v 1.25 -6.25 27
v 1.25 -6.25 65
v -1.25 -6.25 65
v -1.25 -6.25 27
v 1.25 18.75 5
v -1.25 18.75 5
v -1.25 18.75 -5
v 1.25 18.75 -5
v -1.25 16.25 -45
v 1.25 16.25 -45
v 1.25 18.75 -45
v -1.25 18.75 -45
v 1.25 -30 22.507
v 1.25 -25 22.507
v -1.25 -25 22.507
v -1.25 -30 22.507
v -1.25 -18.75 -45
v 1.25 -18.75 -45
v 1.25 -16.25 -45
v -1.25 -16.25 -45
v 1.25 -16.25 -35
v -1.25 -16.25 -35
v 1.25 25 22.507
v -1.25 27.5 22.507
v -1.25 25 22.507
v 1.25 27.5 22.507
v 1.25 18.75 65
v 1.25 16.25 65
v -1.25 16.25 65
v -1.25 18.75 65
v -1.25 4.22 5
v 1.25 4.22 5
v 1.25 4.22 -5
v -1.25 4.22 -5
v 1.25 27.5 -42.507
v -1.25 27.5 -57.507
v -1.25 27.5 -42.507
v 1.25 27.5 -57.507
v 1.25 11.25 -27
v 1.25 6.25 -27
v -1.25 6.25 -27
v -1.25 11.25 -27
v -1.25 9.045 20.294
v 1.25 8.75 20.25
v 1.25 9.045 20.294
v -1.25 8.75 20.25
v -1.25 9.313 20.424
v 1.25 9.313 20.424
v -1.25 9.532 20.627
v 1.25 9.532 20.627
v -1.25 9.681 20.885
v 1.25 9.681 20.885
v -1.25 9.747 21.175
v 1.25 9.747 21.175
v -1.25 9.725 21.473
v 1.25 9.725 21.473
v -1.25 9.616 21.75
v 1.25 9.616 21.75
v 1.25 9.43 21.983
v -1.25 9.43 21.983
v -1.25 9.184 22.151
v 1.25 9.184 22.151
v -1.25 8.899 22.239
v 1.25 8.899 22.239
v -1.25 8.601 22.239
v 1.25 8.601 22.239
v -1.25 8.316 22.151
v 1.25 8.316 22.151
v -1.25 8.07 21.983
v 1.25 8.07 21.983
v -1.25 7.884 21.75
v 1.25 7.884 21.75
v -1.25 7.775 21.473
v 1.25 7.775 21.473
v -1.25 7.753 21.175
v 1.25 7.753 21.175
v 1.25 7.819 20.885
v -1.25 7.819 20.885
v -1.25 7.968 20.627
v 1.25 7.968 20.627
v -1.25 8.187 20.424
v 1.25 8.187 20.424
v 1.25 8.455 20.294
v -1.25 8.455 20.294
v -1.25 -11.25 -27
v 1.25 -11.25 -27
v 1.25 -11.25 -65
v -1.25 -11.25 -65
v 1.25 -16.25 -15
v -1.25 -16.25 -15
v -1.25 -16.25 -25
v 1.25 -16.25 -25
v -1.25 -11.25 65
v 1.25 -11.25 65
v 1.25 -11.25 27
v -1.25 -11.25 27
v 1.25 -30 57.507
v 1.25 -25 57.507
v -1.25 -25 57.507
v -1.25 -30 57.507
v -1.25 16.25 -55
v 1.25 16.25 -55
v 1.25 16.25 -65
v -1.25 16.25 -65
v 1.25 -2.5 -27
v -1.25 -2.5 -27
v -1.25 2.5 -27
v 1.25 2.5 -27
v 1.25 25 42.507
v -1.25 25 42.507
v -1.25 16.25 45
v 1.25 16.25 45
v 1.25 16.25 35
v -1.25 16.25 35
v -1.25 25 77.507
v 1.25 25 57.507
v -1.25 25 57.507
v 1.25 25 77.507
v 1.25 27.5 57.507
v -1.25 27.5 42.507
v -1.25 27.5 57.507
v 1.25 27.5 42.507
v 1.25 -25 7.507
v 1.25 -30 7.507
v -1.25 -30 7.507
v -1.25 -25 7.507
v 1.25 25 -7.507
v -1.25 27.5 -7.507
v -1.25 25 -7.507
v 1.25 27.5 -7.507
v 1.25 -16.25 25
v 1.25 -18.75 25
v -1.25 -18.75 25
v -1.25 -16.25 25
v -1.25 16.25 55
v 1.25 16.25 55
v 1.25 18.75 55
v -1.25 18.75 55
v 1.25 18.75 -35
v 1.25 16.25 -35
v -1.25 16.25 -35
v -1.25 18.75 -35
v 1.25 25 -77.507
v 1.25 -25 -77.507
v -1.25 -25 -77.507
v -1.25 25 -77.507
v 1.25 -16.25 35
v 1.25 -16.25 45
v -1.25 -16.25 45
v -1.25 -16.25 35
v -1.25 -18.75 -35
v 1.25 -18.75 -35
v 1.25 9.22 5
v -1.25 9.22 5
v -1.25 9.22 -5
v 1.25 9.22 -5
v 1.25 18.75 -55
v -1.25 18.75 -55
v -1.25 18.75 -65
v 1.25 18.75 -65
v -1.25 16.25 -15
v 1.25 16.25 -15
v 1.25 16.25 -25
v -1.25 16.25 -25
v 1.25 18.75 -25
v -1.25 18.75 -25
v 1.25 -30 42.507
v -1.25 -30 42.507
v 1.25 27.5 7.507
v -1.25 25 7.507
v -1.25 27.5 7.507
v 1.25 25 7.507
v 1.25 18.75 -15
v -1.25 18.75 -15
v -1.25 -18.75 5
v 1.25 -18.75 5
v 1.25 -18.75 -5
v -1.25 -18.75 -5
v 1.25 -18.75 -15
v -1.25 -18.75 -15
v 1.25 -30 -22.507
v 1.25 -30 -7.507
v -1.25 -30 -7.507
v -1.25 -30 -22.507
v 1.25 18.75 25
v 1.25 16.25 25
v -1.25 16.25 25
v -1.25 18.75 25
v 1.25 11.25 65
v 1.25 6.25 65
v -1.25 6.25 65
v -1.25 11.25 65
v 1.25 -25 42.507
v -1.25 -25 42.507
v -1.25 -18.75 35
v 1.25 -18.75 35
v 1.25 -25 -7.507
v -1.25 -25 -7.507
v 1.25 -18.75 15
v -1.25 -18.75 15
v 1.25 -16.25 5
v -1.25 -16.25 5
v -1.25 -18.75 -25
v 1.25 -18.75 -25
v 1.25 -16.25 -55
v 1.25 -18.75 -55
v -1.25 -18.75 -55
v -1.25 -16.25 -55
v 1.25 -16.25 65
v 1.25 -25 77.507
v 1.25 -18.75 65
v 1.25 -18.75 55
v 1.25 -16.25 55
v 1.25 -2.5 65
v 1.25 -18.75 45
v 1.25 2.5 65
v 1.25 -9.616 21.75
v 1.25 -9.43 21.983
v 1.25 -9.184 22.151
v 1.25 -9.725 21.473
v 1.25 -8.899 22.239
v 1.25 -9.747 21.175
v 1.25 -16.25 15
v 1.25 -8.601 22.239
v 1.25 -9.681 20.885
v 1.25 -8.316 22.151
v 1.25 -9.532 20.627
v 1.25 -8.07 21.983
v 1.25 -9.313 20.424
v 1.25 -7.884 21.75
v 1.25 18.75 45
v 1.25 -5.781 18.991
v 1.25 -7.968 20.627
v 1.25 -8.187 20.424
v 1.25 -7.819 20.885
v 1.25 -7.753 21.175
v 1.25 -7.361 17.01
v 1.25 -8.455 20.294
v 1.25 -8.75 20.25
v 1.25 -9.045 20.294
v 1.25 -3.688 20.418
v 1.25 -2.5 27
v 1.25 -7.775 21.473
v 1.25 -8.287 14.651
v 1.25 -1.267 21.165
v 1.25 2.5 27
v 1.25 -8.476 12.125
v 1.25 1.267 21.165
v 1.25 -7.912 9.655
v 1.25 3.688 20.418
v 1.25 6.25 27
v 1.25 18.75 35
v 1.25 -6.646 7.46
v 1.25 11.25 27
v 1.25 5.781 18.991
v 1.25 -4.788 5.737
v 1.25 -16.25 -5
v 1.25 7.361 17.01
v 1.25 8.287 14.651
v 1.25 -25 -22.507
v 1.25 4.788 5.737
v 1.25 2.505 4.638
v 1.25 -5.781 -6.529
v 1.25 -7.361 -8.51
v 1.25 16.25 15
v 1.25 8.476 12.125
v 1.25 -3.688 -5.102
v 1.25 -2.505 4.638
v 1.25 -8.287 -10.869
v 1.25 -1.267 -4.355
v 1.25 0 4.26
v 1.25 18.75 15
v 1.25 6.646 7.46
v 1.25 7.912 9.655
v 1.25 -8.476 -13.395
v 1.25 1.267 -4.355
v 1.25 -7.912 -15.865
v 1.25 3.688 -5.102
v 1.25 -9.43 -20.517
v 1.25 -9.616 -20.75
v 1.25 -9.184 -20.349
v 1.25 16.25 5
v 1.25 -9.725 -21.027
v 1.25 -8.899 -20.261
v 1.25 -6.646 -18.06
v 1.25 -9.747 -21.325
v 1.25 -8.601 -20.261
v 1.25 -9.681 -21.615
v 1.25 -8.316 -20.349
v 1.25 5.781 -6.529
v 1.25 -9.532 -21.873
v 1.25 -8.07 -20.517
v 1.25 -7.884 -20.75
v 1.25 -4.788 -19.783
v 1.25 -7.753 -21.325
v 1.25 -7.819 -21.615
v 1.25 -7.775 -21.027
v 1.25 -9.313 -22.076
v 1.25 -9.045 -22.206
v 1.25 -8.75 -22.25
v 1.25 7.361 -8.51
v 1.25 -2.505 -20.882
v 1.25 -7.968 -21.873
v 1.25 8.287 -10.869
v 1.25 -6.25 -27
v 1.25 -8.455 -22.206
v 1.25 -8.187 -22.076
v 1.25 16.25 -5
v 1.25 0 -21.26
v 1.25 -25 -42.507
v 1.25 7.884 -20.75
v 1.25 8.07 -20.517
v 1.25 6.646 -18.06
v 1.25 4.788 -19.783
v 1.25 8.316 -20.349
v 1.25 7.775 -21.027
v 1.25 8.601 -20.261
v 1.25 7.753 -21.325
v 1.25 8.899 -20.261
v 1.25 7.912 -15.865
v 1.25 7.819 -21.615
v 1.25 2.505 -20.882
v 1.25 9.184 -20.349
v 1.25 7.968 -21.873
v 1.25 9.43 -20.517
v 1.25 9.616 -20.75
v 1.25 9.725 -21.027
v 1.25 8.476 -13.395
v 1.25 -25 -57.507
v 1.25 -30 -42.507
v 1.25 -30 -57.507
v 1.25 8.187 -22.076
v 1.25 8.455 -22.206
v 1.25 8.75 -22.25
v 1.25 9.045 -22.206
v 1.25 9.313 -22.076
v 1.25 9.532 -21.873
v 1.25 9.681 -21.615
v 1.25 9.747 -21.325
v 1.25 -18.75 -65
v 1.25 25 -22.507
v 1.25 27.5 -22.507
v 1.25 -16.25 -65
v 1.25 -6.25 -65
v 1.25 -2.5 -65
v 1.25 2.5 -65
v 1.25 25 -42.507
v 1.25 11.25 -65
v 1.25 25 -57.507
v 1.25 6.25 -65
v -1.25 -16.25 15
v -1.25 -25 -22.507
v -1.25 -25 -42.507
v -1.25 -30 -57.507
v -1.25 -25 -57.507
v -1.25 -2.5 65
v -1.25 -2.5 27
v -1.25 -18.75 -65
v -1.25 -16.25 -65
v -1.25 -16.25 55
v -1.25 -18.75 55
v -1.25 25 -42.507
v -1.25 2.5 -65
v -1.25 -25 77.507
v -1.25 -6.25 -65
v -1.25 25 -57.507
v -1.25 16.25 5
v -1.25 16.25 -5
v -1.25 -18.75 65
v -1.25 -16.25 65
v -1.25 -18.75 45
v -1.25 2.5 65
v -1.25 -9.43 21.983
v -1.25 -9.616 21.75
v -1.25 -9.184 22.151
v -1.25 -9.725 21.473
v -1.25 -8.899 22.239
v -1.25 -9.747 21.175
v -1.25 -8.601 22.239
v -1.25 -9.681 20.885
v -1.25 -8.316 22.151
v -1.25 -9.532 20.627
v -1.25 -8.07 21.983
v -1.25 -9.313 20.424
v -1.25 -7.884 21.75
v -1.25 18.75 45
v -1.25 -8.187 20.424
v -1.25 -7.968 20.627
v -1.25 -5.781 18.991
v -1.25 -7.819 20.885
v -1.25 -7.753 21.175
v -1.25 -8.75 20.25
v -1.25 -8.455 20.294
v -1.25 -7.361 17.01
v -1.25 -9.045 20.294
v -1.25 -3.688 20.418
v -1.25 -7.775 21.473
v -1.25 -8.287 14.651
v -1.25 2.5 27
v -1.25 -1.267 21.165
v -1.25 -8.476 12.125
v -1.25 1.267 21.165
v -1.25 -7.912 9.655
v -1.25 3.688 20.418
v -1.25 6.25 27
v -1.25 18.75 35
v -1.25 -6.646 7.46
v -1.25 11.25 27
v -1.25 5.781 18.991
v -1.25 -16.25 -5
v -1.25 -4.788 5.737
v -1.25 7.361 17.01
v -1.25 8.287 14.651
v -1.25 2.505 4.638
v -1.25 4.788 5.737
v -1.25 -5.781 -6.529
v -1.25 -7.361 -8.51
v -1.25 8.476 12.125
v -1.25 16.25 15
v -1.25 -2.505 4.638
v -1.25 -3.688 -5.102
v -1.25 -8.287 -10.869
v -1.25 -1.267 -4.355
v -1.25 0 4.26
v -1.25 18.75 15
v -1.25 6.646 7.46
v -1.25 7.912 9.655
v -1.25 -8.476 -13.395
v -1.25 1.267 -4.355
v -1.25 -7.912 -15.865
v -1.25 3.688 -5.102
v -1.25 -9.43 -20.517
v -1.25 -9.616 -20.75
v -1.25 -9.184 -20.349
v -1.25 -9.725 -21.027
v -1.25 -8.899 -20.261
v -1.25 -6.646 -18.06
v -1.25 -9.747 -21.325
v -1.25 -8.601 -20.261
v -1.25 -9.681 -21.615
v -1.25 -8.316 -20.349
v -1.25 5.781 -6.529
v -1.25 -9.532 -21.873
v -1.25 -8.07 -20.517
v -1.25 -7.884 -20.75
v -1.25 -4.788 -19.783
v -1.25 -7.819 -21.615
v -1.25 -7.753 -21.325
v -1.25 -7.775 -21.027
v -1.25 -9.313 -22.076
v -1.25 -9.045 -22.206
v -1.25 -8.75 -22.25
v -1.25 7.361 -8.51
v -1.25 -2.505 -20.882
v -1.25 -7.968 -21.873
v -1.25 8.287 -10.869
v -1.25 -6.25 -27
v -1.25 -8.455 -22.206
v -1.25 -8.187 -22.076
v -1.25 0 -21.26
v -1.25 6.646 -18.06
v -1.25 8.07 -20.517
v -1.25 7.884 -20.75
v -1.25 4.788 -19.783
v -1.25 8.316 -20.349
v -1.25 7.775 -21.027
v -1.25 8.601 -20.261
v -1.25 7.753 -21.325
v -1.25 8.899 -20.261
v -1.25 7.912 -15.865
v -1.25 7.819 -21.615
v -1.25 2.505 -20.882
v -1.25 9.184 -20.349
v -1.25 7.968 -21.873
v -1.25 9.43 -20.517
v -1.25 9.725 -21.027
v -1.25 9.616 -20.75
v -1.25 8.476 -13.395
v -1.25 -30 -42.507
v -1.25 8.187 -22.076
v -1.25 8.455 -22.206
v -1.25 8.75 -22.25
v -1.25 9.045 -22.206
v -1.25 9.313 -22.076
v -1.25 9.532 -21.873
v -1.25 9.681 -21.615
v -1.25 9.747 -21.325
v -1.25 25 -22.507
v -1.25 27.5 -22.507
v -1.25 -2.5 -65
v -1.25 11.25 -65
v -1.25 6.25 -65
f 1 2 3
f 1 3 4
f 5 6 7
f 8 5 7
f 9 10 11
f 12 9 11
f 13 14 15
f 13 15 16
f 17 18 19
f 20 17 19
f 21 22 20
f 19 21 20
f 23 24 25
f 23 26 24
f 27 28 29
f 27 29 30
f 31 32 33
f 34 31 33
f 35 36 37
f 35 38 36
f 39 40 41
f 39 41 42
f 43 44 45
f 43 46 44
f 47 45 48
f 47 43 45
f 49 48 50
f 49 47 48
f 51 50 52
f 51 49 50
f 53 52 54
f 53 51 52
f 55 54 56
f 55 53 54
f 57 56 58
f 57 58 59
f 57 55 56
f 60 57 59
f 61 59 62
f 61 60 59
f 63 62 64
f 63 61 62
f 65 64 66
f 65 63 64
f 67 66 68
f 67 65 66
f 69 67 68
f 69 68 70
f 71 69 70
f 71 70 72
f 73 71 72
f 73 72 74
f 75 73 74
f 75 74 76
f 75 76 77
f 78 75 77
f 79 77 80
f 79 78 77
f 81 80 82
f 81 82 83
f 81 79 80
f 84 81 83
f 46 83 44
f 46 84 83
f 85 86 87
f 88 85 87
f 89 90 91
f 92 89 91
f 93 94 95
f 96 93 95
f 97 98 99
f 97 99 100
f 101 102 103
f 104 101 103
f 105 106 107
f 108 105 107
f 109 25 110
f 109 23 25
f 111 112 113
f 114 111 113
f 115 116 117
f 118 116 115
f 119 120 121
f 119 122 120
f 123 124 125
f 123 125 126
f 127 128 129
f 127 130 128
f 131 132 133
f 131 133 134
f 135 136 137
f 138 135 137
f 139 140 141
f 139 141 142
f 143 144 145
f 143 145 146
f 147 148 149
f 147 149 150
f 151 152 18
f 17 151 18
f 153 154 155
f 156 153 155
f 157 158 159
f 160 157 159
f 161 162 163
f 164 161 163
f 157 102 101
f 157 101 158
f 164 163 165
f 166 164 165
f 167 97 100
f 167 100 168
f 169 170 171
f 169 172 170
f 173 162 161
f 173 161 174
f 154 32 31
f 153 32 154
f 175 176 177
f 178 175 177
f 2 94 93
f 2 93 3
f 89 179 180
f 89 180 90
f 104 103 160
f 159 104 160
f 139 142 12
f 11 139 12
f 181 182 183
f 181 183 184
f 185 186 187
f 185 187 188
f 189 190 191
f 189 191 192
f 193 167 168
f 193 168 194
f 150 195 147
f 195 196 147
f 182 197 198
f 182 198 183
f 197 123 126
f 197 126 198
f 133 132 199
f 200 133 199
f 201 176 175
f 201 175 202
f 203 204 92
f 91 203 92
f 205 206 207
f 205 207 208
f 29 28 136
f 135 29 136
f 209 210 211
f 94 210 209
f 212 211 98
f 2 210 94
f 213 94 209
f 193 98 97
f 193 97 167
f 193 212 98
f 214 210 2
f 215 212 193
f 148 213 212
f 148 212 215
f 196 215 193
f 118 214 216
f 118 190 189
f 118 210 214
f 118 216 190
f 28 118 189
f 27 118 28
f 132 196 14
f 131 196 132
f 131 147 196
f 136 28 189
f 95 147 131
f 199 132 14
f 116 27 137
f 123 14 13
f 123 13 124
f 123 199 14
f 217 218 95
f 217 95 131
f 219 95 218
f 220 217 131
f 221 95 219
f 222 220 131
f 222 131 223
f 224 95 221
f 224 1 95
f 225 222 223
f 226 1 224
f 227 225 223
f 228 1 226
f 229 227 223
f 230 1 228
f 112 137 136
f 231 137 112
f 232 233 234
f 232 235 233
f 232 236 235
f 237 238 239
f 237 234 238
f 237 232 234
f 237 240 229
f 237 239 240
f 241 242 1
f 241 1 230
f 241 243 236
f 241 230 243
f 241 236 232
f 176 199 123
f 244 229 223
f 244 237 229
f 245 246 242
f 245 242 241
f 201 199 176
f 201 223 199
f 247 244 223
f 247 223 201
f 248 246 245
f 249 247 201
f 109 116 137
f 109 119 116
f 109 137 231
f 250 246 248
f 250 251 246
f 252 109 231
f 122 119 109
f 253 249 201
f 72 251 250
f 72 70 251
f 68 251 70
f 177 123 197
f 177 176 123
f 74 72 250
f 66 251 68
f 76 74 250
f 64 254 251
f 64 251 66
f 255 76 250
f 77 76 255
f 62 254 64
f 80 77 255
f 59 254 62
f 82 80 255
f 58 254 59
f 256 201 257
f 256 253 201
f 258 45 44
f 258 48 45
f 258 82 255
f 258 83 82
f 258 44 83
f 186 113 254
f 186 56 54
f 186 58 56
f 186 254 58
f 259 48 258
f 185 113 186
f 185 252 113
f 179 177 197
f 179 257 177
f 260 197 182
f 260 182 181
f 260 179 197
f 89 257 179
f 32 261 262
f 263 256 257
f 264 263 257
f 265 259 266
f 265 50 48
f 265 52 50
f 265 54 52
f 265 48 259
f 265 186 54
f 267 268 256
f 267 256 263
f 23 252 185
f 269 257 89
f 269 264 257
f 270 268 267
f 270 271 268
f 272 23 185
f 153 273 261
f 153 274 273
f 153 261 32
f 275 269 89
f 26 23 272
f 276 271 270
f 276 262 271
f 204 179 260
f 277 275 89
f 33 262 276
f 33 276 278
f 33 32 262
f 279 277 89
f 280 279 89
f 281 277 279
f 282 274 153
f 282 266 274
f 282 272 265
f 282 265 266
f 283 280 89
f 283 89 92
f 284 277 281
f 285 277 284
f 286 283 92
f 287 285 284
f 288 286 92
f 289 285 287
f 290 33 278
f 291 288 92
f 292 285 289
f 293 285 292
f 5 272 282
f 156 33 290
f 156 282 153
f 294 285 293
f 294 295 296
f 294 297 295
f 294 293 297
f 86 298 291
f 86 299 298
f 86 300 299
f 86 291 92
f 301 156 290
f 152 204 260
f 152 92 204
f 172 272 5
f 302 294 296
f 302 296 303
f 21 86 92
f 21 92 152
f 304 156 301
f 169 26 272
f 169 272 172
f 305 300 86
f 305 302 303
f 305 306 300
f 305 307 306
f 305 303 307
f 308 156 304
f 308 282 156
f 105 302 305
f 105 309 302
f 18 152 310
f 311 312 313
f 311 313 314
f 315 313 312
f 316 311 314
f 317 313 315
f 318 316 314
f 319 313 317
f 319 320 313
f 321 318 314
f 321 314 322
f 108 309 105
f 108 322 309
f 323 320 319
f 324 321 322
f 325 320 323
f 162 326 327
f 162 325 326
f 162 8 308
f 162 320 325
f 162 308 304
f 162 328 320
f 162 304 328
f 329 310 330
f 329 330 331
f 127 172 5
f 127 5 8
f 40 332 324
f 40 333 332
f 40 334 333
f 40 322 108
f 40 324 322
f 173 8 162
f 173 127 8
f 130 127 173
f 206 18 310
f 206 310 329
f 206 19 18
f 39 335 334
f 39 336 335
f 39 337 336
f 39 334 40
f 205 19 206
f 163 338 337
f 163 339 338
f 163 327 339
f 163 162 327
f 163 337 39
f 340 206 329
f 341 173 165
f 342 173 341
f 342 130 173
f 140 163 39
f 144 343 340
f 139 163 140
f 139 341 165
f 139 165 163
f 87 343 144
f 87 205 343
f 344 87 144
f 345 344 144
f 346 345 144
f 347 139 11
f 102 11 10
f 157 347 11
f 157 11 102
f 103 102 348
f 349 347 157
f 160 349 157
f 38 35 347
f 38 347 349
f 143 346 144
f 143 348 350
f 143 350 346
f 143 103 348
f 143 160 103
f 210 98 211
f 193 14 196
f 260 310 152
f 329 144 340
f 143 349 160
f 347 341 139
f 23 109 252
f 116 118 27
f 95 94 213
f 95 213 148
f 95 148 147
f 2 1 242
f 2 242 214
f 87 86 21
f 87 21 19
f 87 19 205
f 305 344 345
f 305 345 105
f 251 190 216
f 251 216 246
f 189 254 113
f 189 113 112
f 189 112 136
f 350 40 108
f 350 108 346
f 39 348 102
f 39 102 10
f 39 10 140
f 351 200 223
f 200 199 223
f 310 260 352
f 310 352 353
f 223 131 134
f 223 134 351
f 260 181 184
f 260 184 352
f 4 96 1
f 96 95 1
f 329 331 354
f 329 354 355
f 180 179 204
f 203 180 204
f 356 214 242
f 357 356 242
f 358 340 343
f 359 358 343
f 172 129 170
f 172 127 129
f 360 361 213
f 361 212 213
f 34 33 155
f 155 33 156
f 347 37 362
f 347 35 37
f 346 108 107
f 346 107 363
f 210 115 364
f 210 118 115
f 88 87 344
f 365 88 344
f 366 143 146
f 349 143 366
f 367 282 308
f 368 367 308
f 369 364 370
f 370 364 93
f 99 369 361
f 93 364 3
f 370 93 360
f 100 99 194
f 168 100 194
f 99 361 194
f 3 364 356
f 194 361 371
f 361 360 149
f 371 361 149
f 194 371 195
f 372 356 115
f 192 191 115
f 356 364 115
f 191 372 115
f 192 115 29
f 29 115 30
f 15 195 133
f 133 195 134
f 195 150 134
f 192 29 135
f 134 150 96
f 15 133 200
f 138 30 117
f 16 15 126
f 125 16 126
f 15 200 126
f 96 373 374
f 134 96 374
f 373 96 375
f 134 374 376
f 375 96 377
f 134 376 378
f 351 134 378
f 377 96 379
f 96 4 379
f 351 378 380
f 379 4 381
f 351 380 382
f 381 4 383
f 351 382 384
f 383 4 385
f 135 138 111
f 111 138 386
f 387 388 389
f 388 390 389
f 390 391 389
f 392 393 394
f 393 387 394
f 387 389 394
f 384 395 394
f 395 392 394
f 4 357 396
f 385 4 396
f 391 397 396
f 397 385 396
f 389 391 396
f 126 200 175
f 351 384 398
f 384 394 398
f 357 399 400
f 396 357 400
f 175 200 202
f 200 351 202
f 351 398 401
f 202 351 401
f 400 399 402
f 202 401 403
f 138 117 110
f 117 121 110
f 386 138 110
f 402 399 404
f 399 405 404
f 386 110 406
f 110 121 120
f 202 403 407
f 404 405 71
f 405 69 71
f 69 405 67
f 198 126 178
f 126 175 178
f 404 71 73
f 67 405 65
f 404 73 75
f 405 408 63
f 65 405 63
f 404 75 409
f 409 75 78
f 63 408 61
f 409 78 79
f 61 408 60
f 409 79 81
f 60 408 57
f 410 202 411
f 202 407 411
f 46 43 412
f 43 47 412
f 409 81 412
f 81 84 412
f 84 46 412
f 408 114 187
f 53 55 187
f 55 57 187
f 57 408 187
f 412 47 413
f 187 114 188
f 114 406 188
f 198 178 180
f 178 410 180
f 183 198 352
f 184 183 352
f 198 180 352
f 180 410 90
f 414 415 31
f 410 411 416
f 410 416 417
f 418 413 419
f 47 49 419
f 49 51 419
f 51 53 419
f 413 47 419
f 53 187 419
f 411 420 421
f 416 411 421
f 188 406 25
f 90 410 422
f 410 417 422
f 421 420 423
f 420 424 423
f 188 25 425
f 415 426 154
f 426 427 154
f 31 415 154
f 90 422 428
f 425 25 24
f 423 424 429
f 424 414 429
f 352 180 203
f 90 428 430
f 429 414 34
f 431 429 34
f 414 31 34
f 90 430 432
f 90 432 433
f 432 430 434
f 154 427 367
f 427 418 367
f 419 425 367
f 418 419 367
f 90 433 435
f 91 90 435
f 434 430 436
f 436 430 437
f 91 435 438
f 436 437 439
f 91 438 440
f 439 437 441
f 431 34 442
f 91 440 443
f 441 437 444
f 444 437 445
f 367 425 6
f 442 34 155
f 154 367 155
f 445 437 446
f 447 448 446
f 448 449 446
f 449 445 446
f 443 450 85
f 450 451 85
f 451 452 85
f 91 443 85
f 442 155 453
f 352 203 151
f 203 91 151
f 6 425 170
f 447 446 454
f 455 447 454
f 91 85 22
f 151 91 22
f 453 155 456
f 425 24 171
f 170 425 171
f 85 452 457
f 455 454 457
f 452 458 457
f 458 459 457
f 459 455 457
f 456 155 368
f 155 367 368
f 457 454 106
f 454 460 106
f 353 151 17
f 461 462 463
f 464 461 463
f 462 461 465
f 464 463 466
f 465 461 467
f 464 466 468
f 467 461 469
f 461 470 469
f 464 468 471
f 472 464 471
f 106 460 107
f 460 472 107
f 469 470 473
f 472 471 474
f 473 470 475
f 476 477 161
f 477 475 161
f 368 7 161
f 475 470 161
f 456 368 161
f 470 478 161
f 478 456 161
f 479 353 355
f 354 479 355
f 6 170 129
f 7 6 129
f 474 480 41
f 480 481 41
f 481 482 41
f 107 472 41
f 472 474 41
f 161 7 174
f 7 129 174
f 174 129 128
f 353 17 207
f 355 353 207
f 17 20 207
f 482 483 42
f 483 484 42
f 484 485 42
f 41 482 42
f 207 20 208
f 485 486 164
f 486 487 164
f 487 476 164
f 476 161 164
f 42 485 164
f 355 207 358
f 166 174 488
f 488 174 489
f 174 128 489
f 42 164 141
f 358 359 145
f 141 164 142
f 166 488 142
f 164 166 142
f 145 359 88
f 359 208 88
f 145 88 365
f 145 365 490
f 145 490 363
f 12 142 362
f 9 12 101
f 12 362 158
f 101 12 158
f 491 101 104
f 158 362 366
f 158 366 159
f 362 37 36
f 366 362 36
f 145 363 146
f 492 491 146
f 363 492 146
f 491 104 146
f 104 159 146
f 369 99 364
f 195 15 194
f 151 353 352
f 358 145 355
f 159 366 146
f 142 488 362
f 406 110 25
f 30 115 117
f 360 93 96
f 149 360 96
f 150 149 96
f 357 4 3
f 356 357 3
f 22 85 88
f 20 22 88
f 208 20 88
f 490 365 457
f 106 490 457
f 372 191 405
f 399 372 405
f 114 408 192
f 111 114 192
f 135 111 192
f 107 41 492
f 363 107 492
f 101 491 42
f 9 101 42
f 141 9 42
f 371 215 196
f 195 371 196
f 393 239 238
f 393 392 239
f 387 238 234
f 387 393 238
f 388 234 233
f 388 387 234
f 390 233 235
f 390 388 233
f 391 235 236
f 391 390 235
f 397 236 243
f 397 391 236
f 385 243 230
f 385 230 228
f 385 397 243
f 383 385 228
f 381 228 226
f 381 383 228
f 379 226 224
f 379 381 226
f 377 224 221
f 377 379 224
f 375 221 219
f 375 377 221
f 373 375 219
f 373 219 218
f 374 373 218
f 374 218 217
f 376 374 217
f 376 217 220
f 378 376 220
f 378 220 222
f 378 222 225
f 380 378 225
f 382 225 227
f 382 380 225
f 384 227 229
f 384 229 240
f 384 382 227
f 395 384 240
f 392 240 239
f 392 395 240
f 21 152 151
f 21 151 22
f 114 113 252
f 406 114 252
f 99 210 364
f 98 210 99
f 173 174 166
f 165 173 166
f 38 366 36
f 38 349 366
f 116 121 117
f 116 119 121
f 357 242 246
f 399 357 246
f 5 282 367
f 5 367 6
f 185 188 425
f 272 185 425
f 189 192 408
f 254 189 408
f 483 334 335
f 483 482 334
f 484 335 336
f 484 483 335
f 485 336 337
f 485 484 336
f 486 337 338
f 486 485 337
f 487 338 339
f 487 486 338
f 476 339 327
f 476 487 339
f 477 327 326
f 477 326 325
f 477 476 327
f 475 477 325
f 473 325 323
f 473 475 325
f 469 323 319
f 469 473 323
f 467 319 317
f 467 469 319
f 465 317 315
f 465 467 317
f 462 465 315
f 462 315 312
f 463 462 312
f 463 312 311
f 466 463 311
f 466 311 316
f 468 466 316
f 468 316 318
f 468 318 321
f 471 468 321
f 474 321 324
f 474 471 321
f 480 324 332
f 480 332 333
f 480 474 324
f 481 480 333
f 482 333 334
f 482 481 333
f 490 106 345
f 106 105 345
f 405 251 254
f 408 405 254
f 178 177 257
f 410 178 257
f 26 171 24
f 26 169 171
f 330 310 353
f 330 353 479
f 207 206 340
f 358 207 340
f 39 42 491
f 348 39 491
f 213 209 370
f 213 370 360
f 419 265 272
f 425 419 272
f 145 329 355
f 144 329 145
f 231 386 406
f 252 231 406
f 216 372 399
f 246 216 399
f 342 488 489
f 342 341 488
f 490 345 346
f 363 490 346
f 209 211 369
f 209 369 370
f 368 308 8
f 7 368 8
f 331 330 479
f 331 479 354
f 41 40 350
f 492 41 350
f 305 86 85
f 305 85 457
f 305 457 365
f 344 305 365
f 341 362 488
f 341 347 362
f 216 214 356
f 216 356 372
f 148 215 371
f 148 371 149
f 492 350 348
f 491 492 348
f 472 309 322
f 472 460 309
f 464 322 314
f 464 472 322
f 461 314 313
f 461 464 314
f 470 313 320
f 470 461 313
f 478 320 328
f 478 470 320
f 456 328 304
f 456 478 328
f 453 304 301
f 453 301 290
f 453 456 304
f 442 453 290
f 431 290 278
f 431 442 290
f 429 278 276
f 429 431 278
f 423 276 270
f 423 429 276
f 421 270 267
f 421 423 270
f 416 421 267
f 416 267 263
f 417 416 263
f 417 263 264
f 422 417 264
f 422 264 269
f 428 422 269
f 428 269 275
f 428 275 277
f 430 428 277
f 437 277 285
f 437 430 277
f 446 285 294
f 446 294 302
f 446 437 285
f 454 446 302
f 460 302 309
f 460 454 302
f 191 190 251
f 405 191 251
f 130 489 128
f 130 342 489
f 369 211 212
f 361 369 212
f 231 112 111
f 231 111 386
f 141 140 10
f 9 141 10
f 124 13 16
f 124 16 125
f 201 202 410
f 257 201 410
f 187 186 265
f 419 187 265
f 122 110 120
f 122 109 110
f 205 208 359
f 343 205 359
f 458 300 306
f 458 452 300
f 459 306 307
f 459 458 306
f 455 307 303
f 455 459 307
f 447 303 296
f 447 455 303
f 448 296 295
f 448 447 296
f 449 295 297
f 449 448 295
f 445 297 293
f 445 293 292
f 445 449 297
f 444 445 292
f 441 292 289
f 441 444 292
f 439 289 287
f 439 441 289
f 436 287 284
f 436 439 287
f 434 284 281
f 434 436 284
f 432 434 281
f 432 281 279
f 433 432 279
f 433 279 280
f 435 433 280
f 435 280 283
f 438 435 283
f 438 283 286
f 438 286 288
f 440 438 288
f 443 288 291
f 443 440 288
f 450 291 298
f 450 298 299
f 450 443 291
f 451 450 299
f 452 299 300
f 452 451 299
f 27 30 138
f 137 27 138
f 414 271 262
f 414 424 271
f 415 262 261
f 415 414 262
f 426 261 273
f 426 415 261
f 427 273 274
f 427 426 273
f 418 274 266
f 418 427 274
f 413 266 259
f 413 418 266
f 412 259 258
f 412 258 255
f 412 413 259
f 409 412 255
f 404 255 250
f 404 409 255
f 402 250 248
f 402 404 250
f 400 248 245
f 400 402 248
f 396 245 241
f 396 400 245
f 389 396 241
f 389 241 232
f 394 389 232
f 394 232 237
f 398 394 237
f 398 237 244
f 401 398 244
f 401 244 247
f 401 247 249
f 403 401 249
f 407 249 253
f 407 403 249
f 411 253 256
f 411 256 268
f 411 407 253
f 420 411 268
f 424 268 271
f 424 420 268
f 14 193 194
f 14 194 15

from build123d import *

# Parameters (mm, degrees)
SKETCH1_R           = 1
SKETCH1_R_2         = 8.5
SKETCH1_W           = 10
SKETCH1_H           = 2.5
SKETCH1_W_2         = 38
SKETCH1_H_2         = 5
BOSS_EXTRUDE1_DEPTH = 1.25


with BuildPart() as part:
    # Sketch1 → Boss-Extrude1 (new, symmetric)
    with BuildSketch(Plane(origin=(0, 0, 0), x_dir=(0, 0, -1), z_dir=(1, 0, 0))):
        Polygon((-77.50700933, 25), (-77.50700933, -25), (-57.50700933, -25), (-57.50700933, -30), (-42.50700933, -30), (-42.50700933, -25), (-22.50700933, -25), (-22.50700933, -30), (-7.50700933, -30), (-7.50700933, -25), (7.50700933, -25), (7.50700933, -30), (22.50700933, -30), (22.50700933, -25), (42.50700933, -25), (42.50700933, -30), (57.50700933, -30), (57.50700933, -25), (77.50700933, -25), (77.50700933, 25), (57.50700933, 25), (57.50700933, 27.5), (42.50700933, 27.5), (42.50700933, 25), (22.50700933, 25), (22.50700933, 27.5), (7.50700933, 27.5), (7.50700933, 25), (-7.50700933, 25), (-7.50700933, 27.5), (-22.50700933, 27.5), (-22.50700933, 25), (-42.50700933, 25), (-42.50700933, 27.5), (-57.50700933, 27.5), (-57.50700933, 25), align=None)
        with Locations((-21.25, 8.75)):
            Circle(SKETCH1_R, mode=Mode.SUBTRACT)
        with Locations((-12.76, 0)):
            Circle(SKETCH1_R_2, mode=Mode.SUBTRACT)
        with Locations((-21.25, -8.75)):
            Circle(SKETCH1_R, mode=Mode.SUBTRACT)
        with Locations((12.76, 0)):
            Circle(SKETCH1_R_2, mode=Mode.SUBTRACT)
        with Locations((21.25, -8.75)):
            Circle(SKETCH1_R, mode=Mode.SUBTRACT)
        with Locations((21.25, 8.75)):
            Circle(SKETCH1_R, mode=Mode.SUBTRACT)
        with Locations((0, 17.5)):
            Rectangle(SKETCH1_W, SKETCH1_H, mode=Mode.SUBTRACT)
        with Locations((-46, -8.75)):
            Rectangle(SKETCH1_W_2, SKETCH1_H_2, mode=Mode.SUBTRACT)
        with Locations((0, -17.5)):
            Rectangle(SKETCH1_W, SKETCH1_H, mode=Mode.SUBTRACT)
        with Locations((-20, -17.5)):
            Rectangle(SKETCH1_W, SKETCH1_H, mode=Mode.SUBTRACT)
        with Locations((-20, 17.5)):
            Rectangle(SKETCH1_W, SKETCH1_H, mode=Mode.SUBTRACT)
        with Locations((-40, -17.5)):
            Rectangle(SKETCH1_W, SKETCH1_H, mode=Mode.SUBTRACT)
        with Locations((-40, 17.5)):
            Rectangle(SKETCH1_W, SKETCH1_H, mode=Mode.SUBTRACT)
        with Locations((-60, -17.5)):
            Rectangle(SKETCH1_W, SKETCH1_H, mode=Mode.SUBTRACT)
        with Locations((-60, 17.5)):
            Rectangle(SKETCH1_W, SKETCH1_H, mode=Mode.SUBTRACT)
        with Locations((20, -17.5)):
            Rectangle(SKETCH1_W, SKETCH1_H, mode=Mode.SUBTRACT)
        with Locations((20, 17.5)):
            Rectangle(SKETCH1_W, SKETCH1_H, mode=Mode.SUBTRACT)
        with Locations((40, -17.5)):
            Rectangle(SKETCH1_W, SKETCH1_H, mode=Mode.SUBTRACT)
        with Locations((40, 17.5)):
            Rectangle(SKETCH1_W, SKETCH1_H, mode=Mode.SUBTRACT)
        with Locations((60, -17.5)):
            Rectangle(SKETCH1_W, SKETCH1_H, mode=Mode.SUBTRACT)
        with Locations((60, 17.5)):
            Rectangle(SKETCH1_W, SKETCH1_H, mode=Mode.SUBTRACT)
        with Locations((46, 8.75)):
            Rectangle(SKETCH1_W_2, SKETCH1_H_2, mode=Mode.SUBTRACT)
        with Locations((-46, 0)):
            Rectangle(SKETCH1_W_2, SKETCH1_H_2, mode=Mode.SUBTRACT)
        with Locations((-46, 8.75)):
            Rectangle(SKETCH1_W_2, SKETCH1_H_2, mode=Mode.SUBTRACT)
        with Locations((46, -8.75)):
            Rectangle(SKETCH1_W_2, SKETCH1_H_2, mode=Mode.SUBTRACT)
        with Locations((0, 6.72)):
            Rectangle(SKETCH1_W, SKETCH1_H_2, mode=Mode.SUBTRACT)
        with Locations((46, 0)):
            Rectangle(SKETCH1_W_2, SKETCH1_H_2, mode=Mode.SUBTRACT)
    extrude(amount=BOSS_EXTRUDE1_DEPTH, both=True)


solid = part.part
